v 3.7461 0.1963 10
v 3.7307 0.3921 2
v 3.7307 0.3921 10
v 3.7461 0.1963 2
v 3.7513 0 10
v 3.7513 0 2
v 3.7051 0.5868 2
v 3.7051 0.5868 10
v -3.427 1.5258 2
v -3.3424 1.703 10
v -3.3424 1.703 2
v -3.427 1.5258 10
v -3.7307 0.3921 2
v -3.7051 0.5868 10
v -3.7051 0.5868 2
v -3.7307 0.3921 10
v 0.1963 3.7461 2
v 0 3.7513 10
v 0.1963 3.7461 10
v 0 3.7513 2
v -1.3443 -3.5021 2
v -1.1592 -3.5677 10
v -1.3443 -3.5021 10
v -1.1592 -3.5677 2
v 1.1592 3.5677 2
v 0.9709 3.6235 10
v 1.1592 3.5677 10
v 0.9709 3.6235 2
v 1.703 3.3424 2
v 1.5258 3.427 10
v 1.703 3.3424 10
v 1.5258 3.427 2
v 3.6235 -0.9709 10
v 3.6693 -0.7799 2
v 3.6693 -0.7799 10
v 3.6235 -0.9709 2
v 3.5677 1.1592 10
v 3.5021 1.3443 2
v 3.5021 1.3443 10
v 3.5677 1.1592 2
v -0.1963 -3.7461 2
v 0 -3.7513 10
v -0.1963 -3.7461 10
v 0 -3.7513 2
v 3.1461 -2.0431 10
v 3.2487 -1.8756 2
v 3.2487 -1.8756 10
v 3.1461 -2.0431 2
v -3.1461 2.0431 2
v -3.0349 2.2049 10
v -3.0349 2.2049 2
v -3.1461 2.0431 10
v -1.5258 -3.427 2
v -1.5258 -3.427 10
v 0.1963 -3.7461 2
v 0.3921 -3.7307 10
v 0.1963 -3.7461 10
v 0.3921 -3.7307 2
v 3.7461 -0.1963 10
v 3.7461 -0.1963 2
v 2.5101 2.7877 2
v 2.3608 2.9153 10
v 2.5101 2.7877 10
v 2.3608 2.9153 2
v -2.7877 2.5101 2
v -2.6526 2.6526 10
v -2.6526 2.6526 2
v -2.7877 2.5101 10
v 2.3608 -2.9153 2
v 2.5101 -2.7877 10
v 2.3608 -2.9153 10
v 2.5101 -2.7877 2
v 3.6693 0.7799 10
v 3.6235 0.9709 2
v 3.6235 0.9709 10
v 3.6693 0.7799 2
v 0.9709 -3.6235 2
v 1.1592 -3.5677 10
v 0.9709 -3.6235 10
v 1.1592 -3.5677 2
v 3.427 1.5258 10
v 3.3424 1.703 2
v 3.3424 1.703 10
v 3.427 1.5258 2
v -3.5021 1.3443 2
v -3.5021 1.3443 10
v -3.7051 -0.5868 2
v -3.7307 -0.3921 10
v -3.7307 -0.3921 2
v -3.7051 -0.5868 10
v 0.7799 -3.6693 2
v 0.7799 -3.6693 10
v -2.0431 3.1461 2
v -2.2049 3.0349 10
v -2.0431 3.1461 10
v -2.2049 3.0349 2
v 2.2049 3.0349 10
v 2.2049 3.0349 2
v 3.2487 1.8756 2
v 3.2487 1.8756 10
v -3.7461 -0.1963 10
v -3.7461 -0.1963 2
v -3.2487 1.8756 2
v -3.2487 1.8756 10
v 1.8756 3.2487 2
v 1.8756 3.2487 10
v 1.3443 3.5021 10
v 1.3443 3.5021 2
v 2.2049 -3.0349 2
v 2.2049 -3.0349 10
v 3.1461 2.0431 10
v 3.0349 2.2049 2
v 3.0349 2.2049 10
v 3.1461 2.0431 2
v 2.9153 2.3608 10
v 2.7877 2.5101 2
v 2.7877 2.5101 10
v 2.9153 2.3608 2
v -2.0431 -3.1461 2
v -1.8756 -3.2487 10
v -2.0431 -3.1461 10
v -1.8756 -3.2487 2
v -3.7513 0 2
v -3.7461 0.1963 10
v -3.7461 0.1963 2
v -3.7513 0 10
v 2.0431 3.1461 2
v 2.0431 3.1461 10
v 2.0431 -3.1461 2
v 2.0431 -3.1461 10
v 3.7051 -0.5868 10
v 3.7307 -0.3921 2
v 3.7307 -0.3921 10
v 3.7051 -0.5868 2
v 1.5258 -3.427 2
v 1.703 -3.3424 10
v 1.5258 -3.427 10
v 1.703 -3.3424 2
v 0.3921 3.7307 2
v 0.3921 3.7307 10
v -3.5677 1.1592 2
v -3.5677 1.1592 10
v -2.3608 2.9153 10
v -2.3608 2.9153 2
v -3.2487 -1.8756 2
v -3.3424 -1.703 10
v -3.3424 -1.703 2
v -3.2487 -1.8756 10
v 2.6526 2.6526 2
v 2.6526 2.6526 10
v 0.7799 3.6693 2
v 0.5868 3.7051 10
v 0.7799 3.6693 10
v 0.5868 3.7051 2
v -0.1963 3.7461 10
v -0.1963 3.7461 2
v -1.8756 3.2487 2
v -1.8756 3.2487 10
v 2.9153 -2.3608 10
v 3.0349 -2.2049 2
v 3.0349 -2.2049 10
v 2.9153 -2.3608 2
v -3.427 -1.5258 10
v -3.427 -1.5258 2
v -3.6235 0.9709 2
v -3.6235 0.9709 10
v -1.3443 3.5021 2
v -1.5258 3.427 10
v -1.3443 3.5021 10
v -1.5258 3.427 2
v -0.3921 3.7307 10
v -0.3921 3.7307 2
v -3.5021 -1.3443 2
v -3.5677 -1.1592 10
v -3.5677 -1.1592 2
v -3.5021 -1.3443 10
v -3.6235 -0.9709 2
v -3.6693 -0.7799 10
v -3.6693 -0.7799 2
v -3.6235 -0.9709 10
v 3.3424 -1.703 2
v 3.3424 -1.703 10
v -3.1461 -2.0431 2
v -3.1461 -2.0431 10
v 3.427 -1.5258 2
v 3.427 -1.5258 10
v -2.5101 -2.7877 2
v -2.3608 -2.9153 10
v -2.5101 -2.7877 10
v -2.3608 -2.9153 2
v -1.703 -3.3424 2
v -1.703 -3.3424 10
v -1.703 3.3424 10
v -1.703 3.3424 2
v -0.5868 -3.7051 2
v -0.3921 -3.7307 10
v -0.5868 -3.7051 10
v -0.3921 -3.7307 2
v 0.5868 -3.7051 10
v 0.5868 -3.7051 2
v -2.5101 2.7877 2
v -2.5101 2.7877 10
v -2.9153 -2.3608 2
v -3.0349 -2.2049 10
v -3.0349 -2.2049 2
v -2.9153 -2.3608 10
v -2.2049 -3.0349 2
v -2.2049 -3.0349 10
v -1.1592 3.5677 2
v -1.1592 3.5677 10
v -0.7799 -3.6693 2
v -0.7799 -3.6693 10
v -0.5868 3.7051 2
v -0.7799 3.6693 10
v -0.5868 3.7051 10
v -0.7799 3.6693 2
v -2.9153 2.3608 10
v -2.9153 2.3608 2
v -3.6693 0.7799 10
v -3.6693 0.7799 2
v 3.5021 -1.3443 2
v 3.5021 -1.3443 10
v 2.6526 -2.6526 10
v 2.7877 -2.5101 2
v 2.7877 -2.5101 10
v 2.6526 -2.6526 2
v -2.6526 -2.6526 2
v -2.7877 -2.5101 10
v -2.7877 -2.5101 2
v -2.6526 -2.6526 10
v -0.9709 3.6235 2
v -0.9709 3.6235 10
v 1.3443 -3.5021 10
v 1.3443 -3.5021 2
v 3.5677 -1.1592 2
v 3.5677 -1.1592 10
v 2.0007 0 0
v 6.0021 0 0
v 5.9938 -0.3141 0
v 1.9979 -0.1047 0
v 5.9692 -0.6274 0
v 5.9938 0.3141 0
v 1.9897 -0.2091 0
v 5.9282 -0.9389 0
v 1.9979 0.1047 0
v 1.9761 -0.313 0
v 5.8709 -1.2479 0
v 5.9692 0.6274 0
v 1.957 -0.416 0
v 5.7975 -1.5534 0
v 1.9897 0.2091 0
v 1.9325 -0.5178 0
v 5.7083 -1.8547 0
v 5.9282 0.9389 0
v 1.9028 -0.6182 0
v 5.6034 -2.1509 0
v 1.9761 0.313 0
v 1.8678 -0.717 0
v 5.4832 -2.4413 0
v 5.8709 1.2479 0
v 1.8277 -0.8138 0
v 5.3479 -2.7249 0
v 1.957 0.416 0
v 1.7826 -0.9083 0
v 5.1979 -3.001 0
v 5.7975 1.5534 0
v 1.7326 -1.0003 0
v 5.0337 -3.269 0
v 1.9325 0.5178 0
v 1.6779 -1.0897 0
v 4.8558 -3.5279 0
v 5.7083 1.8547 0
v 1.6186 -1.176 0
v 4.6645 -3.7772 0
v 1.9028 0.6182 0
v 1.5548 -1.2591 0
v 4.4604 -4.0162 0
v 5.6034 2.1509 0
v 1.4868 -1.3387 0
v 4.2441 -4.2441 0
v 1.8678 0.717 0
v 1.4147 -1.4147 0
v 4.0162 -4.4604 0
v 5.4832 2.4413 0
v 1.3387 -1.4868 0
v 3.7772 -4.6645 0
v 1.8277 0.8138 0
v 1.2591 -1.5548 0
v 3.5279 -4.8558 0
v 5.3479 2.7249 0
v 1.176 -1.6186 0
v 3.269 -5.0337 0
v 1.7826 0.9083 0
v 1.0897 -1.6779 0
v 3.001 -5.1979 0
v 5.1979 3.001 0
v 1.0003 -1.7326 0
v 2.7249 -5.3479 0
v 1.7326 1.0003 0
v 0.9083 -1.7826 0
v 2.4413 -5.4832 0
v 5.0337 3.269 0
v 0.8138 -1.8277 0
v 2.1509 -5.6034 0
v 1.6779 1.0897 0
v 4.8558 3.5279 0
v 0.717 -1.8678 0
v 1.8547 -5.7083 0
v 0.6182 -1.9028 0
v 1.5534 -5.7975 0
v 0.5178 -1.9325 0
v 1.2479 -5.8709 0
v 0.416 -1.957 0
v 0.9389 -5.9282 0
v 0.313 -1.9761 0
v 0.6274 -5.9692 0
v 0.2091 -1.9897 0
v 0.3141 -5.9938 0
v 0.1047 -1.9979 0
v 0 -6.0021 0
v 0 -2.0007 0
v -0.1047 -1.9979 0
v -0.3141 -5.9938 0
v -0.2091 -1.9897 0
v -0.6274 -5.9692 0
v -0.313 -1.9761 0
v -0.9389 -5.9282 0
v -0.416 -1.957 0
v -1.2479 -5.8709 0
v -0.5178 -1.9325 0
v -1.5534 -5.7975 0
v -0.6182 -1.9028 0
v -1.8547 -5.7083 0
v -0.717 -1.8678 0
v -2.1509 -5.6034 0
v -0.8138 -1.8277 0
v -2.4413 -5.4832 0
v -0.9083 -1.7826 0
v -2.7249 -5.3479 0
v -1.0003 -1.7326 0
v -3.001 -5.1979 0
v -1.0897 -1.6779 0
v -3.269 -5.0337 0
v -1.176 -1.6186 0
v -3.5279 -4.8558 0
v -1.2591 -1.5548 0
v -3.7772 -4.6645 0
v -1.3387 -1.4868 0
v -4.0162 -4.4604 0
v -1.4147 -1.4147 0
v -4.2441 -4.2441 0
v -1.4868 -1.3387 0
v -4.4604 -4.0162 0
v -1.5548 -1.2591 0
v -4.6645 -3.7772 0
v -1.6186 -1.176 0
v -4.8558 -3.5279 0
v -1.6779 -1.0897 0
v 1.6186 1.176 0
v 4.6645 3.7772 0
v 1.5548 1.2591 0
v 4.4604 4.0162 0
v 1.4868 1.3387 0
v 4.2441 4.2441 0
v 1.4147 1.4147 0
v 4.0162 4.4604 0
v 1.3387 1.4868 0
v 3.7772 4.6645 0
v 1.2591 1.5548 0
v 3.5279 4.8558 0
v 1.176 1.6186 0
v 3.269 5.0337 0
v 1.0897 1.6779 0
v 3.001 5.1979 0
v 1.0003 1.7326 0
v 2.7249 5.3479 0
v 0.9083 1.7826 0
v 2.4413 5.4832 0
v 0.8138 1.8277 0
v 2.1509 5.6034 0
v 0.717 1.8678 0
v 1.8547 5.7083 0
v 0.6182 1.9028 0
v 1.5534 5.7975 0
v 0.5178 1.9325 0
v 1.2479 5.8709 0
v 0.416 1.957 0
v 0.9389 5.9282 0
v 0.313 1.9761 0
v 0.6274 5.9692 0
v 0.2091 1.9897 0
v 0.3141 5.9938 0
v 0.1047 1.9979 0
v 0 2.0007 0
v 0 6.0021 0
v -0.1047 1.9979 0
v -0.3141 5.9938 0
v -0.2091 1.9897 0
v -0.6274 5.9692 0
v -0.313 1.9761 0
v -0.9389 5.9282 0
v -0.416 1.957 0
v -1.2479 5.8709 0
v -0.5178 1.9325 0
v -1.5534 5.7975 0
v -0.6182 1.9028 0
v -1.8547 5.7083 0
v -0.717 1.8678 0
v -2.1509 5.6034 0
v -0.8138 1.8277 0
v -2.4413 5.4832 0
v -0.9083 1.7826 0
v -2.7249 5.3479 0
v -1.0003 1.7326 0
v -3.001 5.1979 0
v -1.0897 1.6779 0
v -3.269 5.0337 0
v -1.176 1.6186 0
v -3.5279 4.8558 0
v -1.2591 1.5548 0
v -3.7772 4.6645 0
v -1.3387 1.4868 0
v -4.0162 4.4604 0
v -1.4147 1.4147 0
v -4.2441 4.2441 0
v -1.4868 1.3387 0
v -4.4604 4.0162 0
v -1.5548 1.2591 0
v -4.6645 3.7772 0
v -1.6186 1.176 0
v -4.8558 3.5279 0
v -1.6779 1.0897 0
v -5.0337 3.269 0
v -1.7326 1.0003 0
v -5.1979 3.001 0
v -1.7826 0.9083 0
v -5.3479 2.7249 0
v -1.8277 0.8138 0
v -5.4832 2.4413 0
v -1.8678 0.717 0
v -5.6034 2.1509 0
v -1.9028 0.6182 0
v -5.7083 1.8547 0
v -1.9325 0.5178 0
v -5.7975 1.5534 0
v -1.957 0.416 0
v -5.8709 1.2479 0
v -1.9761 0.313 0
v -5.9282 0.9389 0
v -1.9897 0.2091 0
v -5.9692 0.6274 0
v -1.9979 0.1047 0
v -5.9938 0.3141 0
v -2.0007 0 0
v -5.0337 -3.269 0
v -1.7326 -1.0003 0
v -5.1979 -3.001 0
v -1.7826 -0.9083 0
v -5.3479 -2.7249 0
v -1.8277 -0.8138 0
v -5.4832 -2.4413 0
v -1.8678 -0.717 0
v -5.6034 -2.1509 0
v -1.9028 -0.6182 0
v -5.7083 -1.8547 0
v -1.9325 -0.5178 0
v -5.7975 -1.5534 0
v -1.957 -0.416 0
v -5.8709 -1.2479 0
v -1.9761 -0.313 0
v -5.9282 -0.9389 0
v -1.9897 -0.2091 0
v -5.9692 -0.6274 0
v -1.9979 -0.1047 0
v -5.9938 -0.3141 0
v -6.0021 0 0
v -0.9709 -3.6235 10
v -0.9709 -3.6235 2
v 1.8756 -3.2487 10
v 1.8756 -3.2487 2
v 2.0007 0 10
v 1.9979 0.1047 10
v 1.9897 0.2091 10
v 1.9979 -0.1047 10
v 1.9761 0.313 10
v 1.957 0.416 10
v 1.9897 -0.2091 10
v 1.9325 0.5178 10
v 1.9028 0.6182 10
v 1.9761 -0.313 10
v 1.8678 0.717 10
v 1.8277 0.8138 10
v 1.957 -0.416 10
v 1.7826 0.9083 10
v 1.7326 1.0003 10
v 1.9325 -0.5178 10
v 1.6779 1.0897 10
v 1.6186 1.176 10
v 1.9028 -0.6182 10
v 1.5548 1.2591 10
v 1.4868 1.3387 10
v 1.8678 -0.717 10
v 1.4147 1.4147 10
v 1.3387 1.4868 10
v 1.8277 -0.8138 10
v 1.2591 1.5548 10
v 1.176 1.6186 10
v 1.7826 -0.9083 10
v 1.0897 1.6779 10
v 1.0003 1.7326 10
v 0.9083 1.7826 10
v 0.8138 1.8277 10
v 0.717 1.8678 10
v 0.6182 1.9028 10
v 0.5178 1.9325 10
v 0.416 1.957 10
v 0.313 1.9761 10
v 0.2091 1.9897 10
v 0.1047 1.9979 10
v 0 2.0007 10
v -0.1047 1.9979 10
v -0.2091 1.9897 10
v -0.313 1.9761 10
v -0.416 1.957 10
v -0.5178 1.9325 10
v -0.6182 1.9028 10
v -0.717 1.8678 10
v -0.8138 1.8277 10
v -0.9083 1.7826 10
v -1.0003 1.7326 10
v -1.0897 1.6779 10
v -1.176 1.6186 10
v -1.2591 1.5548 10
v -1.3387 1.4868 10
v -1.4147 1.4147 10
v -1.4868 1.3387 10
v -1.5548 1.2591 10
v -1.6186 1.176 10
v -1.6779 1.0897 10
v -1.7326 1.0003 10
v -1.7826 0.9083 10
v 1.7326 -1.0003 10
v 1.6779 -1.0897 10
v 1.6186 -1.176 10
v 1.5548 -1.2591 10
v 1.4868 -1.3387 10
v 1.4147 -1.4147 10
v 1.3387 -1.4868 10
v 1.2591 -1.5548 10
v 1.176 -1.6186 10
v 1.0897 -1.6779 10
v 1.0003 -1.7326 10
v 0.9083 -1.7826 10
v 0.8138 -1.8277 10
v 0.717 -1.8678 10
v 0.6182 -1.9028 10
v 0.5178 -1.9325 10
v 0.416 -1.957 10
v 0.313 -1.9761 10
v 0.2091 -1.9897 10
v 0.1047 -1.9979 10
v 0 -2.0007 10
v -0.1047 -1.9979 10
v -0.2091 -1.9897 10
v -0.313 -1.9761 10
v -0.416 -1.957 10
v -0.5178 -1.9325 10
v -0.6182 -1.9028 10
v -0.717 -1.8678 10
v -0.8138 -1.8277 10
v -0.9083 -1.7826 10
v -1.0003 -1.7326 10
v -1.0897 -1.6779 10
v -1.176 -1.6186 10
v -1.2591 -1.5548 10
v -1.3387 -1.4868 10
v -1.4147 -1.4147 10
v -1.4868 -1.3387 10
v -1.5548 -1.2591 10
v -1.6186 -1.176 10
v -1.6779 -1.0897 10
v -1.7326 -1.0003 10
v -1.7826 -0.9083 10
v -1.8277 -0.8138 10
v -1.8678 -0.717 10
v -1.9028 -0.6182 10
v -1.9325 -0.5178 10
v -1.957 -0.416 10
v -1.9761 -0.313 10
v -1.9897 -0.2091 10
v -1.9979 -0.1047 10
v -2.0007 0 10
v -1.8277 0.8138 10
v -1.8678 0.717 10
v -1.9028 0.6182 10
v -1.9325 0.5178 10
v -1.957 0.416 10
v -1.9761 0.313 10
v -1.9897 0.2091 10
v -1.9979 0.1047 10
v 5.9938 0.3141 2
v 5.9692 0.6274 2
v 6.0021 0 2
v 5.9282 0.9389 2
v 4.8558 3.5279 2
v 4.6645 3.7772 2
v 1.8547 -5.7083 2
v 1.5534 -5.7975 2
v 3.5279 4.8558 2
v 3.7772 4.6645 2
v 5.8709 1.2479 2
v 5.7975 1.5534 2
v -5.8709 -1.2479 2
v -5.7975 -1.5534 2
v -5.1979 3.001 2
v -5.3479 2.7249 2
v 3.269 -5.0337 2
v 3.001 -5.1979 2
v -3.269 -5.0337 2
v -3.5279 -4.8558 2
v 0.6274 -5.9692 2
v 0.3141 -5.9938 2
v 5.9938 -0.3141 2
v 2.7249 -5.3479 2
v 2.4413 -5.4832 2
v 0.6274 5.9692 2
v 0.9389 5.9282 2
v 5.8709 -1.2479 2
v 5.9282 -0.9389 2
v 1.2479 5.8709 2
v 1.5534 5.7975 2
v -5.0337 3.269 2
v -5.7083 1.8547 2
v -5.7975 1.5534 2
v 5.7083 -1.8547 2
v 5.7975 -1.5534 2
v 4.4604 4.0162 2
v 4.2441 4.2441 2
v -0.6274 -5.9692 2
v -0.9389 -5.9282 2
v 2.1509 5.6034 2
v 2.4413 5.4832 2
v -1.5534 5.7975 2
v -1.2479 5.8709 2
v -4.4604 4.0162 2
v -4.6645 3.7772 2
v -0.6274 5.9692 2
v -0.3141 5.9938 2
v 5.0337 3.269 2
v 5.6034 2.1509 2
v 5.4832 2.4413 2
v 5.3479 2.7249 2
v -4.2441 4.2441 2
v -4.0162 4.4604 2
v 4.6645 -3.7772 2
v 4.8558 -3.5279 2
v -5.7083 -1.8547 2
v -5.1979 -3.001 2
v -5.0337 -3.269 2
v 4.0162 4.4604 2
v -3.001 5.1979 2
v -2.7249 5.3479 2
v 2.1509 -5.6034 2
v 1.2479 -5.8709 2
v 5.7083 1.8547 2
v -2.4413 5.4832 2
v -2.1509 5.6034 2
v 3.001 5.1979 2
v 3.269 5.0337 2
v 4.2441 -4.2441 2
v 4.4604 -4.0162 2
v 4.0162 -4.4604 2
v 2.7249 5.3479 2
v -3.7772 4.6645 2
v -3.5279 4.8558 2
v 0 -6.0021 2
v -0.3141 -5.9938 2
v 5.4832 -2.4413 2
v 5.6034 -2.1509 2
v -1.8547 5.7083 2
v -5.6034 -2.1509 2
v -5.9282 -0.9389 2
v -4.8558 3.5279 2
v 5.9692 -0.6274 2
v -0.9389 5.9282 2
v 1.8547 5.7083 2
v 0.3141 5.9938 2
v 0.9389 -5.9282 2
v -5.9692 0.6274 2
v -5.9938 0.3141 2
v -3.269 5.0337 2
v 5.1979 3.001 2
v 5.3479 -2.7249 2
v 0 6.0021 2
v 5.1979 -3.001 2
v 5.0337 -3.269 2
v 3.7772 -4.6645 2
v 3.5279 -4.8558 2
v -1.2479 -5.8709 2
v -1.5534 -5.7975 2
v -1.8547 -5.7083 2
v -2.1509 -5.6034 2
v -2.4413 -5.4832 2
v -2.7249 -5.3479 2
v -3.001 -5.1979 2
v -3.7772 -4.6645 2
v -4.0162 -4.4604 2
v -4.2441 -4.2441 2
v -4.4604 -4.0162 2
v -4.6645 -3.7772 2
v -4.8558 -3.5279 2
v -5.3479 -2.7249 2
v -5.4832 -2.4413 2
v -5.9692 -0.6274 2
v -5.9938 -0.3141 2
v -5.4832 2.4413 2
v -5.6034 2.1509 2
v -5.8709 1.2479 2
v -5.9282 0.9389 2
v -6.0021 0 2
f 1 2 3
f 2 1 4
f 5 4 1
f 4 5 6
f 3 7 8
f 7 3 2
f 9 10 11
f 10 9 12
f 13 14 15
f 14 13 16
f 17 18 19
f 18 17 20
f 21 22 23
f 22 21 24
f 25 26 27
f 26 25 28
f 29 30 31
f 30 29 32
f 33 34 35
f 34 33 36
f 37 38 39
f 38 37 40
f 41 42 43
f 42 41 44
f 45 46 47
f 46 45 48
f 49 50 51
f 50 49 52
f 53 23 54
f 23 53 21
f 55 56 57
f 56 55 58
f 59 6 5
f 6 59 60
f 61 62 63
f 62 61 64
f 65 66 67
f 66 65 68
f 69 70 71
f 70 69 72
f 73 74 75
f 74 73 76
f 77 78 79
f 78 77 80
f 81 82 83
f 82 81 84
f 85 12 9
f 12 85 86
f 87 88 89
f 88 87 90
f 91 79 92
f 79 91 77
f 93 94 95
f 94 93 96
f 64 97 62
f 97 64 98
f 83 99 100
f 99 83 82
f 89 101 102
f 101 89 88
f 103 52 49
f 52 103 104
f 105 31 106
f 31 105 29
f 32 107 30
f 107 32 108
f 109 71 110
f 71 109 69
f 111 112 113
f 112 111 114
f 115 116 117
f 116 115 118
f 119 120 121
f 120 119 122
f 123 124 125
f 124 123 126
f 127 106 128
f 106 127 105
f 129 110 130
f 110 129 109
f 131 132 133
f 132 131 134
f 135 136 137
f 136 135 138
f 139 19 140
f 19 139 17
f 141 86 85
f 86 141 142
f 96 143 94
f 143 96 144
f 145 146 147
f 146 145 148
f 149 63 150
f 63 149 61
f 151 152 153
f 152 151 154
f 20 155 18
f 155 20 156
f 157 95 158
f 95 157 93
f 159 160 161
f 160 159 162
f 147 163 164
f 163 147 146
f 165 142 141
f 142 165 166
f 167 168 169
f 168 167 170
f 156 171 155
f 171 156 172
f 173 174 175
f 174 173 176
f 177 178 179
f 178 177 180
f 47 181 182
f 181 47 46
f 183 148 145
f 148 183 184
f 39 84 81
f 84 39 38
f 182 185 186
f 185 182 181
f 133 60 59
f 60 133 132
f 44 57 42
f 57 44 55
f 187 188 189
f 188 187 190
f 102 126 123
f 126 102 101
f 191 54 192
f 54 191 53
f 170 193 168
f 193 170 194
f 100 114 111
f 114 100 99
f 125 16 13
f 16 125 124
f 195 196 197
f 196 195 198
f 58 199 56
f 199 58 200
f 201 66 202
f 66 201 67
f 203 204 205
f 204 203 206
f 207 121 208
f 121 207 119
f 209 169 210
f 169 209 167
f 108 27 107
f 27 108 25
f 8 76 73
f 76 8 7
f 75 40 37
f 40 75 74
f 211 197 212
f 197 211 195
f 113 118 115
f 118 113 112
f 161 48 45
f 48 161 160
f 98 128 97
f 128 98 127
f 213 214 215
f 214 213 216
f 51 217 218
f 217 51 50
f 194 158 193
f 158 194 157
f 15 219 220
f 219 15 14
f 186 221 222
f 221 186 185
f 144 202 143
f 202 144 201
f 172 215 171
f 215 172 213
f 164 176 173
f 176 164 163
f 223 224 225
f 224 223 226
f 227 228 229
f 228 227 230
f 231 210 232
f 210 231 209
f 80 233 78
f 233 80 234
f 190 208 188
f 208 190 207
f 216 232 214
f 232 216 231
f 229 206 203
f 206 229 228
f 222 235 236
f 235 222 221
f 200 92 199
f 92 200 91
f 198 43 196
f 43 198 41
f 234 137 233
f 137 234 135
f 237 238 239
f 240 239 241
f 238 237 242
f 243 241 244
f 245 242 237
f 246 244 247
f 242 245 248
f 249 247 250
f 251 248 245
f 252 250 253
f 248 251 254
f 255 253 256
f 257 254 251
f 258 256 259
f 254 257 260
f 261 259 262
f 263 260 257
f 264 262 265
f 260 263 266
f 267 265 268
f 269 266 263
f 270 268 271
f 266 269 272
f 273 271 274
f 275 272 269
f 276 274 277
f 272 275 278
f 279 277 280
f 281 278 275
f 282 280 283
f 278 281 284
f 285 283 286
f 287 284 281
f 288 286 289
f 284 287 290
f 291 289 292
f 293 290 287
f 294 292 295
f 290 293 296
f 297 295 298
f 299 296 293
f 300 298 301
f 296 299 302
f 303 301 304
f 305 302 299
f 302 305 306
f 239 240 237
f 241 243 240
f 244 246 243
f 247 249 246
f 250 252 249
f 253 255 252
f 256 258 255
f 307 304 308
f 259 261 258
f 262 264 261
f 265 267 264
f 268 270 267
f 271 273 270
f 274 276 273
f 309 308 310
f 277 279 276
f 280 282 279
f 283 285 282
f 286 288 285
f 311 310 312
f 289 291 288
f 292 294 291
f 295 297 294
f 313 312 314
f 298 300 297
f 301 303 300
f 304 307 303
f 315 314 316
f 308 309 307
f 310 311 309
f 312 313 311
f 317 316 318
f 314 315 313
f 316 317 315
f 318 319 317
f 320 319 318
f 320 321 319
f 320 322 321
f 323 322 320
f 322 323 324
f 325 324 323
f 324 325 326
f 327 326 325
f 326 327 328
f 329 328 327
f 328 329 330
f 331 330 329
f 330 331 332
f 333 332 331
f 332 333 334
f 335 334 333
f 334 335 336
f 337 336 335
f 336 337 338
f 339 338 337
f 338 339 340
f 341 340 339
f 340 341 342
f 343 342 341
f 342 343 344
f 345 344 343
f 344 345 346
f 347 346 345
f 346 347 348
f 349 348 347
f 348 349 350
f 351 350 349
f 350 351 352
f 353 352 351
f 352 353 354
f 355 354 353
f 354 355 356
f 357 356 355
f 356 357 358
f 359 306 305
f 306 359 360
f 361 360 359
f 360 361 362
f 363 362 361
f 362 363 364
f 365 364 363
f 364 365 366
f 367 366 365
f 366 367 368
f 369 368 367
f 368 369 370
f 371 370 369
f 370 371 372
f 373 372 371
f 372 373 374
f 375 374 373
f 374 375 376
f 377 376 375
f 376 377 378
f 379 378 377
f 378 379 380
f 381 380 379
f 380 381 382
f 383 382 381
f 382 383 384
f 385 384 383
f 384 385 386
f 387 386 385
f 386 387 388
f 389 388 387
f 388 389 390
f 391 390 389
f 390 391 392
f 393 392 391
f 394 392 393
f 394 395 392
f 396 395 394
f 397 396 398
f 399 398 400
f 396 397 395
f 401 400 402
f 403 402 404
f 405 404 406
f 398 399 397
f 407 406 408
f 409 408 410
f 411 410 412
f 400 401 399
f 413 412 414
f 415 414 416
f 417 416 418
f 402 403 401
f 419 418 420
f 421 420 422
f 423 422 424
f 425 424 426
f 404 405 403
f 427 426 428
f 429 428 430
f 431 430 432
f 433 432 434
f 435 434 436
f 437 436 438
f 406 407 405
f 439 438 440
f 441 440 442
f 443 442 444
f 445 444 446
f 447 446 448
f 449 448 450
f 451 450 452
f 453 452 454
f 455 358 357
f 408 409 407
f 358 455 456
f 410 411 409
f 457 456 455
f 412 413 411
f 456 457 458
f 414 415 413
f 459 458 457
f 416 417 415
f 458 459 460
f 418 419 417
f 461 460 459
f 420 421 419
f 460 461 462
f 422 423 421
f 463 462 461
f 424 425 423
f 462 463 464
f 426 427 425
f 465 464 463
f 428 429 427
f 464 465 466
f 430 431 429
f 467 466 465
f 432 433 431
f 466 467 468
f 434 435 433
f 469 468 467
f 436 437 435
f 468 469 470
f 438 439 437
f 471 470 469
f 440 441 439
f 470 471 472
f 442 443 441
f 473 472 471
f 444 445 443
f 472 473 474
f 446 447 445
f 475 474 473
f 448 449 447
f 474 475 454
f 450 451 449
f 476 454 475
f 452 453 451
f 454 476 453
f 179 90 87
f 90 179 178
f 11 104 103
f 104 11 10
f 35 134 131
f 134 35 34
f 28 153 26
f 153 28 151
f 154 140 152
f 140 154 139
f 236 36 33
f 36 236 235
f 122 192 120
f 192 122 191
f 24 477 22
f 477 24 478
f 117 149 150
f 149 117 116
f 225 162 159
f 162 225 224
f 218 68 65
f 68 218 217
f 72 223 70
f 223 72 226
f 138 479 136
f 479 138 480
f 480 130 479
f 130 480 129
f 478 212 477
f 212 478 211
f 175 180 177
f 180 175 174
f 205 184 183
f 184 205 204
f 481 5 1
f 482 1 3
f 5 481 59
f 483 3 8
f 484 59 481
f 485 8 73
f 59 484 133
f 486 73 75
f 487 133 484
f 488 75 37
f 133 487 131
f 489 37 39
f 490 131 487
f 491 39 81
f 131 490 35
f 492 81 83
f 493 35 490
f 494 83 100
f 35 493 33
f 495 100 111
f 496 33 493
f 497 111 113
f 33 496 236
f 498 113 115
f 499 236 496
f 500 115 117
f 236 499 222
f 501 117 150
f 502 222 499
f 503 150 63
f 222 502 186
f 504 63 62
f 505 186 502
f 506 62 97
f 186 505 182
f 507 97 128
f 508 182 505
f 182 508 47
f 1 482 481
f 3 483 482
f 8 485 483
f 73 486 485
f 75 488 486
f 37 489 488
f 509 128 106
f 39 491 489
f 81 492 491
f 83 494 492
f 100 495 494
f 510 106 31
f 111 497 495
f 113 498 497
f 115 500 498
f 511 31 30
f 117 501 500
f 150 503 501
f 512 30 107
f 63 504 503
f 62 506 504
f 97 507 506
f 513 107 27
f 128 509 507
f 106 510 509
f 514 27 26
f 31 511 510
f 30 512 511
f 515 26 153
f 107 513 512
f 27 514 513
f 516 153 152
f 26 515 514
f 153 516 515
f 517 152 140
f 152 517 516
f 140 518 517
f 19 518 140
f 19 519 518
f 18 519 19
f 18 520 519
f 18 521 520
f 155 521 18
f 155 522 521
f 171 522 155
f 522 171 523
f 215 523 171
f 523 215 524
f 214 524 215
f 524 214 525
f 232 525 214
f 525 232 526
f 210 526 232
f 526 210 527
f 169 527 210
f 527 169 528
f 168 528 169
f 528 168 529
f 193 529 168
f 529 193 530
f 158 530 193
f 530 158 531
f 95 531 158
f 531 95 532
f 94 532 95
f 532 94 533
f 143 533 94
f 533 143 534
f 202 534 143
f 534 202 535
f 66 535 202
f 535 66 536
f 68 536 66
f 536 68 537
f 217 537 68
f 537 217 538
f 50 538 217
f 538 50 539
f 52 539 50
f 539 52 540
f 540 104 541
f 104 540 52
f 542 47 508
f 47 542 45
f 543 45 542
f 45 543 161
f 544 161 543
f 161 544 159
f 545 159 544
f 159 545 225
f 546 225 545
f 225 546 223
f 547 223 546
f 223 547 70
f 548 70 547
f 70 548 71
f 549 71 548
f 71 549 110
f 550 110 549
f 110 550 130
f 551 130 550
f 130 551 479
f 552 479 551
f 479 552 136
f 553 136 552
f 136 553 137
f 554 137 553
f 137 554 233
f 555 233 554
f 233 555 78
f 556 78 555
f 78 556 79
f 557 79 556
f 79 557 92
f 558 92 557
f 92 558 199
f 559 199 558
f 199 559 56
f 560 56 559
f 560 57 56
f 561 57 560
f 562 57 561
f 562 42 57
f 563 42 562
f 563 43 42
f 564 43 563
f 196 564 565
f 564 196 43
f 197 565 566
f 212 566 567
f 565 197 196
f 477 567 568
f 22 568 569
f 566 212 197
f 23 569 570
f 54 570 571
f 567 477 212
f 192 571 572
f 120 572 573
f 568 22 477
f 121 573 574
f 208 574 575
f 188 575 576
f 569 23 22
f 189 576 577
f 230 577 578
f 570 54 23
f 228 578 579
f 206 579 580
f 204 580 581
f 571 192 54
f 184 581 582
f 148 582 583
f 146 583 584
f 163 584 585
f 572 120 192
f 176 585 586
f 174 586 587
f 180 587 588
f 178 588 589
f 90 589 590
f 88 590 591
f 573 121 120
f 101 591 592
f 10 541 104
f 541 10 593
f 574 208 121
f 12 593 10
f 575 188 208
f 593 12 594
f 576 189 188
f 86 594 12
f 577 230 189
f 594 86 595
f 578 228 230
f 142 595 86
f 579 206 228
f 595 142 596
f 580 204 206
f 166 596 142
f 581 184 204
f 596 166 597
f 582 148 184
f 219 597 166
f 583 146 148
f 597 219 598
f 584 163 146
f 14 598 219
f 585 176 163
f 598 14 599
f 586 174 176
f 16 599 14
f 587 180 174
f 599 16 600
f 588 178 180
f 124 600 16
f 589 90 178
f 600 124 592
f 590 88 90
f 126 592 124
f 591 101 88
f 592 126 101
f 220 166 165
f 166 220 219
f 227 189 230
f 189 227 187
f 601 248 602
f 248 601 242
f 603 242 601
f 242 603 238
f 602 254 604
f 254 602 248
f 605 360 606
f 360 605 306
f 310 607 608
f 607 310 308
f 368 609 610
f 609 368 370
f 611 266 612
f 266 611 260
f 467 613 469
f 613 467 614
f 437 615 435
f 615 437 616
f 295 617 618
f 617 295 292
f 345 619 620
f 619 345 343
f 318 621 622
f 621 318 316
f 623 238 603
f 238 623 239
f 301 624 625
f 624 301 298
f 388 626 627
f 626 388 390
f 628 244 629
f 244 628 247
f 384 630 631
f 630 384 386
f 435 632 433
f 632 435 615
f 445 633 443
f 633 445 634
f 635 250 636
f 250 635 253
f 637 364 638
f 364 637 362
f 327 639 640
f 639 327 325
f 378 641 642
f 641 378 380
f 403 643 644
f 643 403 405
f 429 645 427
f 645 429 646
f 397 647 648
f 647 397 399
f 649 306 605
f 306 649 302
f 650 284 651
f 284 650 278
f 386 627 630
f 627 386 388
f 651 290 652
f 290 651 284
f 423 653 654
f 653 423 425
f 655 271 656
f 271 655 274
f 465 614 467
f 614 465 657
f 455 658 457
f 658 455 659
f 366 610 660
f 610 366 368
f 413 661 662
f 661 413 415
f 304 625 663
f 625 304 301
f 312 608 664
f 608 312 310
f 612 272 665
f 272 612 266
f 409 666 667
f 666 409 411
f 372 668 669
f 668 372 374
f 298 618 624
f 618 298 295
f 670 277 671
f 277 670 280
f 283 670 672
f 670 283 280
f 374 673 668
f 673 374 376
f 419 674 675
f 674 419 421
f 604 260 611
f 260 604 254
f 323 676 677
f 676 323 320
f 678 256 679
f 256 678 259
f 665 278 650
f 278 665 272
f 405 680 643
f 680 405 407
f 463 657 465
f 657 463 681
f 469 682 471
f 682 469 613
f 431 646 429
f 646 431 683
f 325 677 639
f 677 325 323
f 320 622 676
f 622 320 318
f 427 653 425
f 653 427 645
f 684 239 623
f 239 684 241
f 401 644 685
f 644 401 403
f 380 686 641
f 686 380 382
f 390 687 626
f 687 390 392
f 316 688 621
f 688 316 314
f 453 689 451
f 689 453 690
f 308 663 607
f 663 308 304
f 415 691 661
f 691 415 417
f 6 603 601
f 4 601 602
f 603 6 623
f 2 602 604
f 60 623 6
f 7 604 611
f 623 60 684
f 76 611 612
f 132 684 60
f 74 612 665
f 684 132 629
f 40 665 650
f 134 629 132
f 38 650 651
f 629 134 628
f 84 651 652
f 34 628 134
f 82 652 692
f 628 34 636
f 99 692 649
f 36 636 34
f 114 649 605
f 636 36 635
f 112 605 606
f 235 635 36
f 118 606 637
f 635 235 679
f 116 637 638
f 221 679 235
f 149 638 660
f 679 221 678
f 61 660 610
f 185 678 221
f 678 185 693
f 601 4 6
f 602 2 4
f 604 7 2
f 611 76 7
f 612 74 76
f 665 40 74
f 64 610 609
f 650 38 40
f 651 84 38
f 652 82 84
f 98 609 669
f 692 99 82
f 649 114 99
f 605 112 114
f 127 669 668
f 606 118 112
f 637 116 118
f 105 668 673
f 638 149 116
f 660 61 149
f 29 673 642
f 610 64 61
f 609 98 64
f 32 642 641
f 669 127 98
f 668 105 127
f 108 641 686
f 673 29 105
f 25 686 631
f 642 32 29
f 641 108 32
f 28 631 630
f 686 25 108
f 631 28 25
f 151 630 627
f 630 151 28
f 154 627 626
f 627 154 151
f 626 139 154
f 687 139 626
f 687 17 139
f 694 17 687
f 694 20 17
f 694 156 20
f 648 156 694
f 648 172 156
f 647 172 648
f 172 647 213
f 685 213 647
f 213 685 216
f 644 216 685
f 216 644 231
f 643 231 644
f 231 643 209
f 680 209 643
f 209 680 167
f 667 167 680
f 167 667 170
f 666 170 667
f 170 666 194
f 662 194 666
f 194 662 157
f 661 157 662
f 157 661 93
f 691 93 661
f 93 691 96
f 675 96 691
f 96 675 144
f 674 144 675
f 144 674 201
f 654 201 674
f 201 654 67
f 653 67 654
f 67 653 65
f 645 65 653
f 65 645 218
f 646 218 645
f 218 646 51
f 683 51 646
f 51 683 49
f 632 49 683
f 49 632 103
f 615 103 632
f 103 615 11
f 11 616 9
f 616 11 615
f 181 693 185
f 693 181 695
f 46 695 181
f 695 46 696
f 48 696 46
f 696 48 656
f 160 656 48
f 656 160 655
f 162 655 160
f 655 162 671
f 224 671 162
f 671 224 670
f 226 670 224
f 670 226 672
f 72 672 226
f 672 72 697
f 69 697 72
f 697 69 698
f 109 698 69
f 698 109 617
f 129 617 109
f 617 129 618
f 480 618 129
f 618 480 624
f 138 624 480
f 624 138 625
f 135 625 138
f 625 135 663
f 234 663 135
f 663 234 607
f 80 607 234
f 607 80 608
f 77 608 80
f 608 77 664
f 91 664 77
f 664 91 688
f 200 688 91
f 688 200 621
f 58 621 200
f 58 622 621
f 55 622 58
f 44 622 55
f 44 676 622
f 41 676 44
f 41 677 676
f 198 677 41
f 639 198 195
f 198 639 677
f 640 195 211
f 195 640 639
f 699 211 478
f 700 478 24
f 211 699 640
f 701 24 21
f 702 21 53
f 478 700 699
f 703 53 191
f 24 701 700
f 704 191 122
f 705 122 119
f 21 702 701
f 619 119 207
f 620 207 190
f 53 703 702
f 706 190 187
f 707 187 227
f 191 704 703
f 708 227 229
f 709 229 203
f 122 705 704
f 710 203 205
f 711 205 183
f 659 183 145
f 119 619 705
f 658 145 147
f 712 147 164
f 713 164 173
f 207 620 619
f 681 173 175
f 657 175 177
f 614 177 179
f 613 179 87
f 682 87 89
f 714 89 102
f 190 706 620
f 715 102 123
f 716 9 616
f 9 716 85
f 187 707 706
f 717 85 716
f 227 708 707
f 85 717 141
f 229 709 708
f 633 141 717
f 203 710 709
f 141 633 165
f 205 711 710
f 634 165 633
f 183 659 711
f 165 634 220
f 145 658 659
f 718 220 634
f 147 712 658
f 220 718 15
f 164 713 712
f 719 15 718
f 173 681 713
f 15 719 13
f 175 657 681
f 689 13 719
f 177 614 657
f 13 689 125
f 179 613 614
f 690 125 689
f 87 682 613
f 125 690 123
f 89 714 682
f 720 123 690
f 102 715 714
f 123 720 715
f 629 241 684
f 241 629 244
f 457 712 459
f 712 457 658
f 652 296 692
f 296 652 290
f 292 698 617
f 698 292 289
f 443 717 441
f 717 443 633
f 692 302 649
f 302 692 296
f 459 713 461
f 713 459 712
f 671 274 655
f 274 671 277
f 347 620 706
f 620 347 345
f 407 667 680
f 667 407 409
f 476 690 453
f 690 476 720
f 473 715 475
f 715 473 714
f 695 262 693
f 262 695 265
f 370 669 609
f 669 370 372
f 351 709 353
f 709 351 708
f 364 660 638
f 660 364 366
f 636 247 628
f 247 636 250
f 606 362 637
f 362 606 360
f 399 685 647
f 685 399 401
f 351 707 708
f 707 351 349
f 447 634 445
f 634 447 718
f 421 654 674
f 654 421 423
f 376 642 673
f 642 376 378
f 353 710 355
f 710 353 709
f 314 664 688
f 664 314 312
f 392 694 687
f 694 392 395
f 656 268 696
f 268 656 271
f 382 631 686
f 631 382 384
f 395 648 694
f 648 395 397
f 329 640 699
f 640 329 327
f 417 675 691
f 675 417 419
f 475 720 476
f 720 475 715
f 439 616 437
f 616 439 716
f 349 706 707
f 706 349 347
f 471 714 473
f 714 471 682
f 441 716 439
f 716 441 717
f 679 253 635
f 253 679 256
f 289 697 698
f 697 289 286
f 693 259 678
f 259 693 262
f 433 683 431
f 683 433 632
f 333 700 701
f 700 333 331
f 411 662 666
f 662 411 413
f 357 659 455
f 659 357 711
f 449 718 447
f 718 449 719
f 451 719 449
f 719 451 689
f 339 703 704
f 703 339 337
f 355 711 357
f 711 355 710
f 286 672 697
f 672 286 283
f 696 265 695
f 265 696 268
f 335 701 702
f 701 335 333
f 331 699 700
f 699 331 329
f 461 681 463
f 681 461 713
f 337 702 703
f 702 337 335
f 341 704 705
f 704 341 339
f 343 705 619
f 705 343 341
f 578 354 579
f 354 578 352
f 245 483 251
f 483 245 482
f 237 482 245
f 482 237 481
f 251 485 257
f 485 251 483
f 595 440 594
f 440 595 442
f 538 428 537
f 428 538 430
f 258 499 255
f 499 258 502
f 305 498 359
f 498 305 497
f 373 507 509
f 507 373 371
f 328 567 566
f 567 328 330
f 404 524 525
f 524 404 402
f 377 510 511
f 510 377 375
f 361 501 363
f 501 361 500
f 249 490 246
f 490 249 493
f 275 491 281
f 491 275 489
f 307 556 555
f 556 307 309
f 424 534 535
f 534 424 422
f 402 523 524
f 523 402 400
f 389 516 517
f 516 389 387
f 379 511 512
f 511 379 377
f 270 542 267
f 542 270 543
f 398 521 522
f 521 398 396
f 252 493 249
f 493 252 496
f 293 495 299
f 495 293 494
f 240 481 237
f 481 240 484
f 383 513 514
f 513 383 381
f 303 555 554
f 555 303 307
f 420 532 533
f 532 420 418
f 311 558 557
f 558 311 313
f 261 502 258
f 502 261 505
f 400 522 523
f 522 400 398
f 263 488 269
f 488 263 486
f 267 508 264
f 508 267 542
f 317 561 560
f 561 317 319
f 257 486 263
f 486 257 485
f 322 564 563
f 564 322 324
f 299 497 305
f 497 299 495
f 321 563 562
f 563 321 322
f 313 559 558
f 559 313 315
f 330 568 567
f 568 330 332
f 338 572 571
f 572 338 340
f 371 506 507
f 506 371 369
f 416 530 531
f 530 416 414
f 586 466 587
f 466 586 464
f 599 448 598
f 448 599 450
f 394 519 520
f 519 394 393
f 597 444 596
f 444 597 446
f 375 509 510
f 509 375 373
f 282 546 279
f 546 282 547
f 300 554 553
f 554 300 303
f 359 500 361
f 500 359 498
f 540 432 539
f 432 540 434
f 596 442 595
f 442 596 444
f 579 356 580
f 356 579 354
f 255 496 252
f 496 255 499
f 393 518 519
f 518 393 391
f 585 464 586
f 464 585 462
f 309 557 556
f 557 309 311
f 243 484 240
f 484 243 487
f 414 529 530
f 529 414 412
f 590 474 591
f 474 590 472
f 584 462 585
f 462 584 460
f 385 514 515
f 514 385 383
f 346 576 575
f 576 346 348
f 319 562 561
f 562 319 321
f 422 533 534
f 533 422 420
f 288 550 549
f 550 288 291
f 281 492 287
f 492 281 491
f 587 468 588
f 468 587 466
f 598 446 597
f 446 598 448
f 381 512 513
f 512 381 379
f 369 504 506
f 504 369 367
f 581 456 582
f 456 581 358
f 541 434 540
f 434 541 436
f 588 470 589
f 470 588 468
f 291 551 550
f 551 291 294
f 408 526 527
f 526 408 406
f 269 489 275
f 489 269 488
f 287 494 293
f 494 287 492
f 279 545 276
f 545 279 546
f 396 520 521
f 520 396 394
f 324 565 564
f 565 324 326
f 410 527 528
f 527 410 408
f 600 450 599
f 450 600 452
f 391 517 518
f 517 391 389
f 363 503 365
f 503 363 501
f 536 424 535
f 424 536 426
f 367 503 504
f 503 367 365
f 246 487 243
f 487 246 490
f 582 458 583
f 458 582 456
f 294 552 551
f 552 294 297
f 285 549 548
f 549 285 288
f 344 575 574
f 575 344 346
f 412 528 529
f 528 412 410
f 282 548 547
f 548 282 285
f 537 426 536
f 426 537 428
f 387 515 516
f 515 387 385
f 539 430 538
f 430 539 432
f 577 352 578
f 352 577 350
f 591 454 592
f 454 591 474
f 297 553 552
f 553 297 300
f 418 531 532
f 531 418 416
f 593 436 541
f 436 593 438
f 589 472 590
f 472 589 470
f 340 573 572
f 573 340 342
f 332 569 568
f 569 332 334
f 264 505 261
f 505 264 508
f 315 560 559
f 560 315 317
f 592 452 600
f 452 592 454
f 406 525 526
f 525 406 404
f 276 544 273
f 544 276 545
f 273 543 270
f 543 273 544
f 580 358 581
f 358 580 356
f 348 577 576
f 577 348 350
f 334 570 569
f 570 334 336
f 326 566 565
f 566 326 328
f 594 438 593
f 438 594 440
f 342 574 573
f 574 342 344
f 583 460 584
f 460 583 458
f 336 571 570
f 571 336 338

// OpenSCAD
// Customizable Dish Rack End Stops
// Copyright: Olle Wreede 2019
// License: CC BY-SA

//CUSTOMIZER VARIABLES

// Height in mm
height = 10; // [8:20]

// Depth of hole in mm
depth_of_hole = 10; // [4:0.1:20]

// Diameter in mm of hole
diameter_of_hole = 4.0; // [3.0:0.1:6.0]

// Diameter in mm of cylinder
diameter_of_cylinder = 7.5; // [5:0.1:10]

// Diameter in mm of shoulder
diameter_of_shoulder = 12; // [10:0.1:16]

// Thickness in mm of shoulder
thickness_of_shoulder = 2; // [0.6:0.1:4.0]

//CUSTOMIZER VARIABLES END

/* [Hidden] */

$fn=120;

module cylinder_outer(height, diameter, fn) {
   fudge = 1 / cos(180 / fn);
   cylinder(h=height, r=diameter / 2 * fudge, $fn=fn);
}

module plopp(height, diameter, thickness_of_shoulder, diameter_of_shoulder) {
    difference() {
        union() {
            // Cylinder
            cylinder_outer(height, diameter, $fn);

            // Shoulder
            cylinder_outer(thickness_of_shoulder, diameter_of_shoulder, $fn);
        }
        
        translate([0, 0, height - depth_of_hole])
        //cylinder(h=depth_of_hole, d=diameter_of_hole');
        cylinder_outer(depth_of_hole, diameter_of_hole, $fn);
    }
}

plopp(height, diameter_of_cylinder, thickness_of_shoulder, diameter_of_shoulder);
